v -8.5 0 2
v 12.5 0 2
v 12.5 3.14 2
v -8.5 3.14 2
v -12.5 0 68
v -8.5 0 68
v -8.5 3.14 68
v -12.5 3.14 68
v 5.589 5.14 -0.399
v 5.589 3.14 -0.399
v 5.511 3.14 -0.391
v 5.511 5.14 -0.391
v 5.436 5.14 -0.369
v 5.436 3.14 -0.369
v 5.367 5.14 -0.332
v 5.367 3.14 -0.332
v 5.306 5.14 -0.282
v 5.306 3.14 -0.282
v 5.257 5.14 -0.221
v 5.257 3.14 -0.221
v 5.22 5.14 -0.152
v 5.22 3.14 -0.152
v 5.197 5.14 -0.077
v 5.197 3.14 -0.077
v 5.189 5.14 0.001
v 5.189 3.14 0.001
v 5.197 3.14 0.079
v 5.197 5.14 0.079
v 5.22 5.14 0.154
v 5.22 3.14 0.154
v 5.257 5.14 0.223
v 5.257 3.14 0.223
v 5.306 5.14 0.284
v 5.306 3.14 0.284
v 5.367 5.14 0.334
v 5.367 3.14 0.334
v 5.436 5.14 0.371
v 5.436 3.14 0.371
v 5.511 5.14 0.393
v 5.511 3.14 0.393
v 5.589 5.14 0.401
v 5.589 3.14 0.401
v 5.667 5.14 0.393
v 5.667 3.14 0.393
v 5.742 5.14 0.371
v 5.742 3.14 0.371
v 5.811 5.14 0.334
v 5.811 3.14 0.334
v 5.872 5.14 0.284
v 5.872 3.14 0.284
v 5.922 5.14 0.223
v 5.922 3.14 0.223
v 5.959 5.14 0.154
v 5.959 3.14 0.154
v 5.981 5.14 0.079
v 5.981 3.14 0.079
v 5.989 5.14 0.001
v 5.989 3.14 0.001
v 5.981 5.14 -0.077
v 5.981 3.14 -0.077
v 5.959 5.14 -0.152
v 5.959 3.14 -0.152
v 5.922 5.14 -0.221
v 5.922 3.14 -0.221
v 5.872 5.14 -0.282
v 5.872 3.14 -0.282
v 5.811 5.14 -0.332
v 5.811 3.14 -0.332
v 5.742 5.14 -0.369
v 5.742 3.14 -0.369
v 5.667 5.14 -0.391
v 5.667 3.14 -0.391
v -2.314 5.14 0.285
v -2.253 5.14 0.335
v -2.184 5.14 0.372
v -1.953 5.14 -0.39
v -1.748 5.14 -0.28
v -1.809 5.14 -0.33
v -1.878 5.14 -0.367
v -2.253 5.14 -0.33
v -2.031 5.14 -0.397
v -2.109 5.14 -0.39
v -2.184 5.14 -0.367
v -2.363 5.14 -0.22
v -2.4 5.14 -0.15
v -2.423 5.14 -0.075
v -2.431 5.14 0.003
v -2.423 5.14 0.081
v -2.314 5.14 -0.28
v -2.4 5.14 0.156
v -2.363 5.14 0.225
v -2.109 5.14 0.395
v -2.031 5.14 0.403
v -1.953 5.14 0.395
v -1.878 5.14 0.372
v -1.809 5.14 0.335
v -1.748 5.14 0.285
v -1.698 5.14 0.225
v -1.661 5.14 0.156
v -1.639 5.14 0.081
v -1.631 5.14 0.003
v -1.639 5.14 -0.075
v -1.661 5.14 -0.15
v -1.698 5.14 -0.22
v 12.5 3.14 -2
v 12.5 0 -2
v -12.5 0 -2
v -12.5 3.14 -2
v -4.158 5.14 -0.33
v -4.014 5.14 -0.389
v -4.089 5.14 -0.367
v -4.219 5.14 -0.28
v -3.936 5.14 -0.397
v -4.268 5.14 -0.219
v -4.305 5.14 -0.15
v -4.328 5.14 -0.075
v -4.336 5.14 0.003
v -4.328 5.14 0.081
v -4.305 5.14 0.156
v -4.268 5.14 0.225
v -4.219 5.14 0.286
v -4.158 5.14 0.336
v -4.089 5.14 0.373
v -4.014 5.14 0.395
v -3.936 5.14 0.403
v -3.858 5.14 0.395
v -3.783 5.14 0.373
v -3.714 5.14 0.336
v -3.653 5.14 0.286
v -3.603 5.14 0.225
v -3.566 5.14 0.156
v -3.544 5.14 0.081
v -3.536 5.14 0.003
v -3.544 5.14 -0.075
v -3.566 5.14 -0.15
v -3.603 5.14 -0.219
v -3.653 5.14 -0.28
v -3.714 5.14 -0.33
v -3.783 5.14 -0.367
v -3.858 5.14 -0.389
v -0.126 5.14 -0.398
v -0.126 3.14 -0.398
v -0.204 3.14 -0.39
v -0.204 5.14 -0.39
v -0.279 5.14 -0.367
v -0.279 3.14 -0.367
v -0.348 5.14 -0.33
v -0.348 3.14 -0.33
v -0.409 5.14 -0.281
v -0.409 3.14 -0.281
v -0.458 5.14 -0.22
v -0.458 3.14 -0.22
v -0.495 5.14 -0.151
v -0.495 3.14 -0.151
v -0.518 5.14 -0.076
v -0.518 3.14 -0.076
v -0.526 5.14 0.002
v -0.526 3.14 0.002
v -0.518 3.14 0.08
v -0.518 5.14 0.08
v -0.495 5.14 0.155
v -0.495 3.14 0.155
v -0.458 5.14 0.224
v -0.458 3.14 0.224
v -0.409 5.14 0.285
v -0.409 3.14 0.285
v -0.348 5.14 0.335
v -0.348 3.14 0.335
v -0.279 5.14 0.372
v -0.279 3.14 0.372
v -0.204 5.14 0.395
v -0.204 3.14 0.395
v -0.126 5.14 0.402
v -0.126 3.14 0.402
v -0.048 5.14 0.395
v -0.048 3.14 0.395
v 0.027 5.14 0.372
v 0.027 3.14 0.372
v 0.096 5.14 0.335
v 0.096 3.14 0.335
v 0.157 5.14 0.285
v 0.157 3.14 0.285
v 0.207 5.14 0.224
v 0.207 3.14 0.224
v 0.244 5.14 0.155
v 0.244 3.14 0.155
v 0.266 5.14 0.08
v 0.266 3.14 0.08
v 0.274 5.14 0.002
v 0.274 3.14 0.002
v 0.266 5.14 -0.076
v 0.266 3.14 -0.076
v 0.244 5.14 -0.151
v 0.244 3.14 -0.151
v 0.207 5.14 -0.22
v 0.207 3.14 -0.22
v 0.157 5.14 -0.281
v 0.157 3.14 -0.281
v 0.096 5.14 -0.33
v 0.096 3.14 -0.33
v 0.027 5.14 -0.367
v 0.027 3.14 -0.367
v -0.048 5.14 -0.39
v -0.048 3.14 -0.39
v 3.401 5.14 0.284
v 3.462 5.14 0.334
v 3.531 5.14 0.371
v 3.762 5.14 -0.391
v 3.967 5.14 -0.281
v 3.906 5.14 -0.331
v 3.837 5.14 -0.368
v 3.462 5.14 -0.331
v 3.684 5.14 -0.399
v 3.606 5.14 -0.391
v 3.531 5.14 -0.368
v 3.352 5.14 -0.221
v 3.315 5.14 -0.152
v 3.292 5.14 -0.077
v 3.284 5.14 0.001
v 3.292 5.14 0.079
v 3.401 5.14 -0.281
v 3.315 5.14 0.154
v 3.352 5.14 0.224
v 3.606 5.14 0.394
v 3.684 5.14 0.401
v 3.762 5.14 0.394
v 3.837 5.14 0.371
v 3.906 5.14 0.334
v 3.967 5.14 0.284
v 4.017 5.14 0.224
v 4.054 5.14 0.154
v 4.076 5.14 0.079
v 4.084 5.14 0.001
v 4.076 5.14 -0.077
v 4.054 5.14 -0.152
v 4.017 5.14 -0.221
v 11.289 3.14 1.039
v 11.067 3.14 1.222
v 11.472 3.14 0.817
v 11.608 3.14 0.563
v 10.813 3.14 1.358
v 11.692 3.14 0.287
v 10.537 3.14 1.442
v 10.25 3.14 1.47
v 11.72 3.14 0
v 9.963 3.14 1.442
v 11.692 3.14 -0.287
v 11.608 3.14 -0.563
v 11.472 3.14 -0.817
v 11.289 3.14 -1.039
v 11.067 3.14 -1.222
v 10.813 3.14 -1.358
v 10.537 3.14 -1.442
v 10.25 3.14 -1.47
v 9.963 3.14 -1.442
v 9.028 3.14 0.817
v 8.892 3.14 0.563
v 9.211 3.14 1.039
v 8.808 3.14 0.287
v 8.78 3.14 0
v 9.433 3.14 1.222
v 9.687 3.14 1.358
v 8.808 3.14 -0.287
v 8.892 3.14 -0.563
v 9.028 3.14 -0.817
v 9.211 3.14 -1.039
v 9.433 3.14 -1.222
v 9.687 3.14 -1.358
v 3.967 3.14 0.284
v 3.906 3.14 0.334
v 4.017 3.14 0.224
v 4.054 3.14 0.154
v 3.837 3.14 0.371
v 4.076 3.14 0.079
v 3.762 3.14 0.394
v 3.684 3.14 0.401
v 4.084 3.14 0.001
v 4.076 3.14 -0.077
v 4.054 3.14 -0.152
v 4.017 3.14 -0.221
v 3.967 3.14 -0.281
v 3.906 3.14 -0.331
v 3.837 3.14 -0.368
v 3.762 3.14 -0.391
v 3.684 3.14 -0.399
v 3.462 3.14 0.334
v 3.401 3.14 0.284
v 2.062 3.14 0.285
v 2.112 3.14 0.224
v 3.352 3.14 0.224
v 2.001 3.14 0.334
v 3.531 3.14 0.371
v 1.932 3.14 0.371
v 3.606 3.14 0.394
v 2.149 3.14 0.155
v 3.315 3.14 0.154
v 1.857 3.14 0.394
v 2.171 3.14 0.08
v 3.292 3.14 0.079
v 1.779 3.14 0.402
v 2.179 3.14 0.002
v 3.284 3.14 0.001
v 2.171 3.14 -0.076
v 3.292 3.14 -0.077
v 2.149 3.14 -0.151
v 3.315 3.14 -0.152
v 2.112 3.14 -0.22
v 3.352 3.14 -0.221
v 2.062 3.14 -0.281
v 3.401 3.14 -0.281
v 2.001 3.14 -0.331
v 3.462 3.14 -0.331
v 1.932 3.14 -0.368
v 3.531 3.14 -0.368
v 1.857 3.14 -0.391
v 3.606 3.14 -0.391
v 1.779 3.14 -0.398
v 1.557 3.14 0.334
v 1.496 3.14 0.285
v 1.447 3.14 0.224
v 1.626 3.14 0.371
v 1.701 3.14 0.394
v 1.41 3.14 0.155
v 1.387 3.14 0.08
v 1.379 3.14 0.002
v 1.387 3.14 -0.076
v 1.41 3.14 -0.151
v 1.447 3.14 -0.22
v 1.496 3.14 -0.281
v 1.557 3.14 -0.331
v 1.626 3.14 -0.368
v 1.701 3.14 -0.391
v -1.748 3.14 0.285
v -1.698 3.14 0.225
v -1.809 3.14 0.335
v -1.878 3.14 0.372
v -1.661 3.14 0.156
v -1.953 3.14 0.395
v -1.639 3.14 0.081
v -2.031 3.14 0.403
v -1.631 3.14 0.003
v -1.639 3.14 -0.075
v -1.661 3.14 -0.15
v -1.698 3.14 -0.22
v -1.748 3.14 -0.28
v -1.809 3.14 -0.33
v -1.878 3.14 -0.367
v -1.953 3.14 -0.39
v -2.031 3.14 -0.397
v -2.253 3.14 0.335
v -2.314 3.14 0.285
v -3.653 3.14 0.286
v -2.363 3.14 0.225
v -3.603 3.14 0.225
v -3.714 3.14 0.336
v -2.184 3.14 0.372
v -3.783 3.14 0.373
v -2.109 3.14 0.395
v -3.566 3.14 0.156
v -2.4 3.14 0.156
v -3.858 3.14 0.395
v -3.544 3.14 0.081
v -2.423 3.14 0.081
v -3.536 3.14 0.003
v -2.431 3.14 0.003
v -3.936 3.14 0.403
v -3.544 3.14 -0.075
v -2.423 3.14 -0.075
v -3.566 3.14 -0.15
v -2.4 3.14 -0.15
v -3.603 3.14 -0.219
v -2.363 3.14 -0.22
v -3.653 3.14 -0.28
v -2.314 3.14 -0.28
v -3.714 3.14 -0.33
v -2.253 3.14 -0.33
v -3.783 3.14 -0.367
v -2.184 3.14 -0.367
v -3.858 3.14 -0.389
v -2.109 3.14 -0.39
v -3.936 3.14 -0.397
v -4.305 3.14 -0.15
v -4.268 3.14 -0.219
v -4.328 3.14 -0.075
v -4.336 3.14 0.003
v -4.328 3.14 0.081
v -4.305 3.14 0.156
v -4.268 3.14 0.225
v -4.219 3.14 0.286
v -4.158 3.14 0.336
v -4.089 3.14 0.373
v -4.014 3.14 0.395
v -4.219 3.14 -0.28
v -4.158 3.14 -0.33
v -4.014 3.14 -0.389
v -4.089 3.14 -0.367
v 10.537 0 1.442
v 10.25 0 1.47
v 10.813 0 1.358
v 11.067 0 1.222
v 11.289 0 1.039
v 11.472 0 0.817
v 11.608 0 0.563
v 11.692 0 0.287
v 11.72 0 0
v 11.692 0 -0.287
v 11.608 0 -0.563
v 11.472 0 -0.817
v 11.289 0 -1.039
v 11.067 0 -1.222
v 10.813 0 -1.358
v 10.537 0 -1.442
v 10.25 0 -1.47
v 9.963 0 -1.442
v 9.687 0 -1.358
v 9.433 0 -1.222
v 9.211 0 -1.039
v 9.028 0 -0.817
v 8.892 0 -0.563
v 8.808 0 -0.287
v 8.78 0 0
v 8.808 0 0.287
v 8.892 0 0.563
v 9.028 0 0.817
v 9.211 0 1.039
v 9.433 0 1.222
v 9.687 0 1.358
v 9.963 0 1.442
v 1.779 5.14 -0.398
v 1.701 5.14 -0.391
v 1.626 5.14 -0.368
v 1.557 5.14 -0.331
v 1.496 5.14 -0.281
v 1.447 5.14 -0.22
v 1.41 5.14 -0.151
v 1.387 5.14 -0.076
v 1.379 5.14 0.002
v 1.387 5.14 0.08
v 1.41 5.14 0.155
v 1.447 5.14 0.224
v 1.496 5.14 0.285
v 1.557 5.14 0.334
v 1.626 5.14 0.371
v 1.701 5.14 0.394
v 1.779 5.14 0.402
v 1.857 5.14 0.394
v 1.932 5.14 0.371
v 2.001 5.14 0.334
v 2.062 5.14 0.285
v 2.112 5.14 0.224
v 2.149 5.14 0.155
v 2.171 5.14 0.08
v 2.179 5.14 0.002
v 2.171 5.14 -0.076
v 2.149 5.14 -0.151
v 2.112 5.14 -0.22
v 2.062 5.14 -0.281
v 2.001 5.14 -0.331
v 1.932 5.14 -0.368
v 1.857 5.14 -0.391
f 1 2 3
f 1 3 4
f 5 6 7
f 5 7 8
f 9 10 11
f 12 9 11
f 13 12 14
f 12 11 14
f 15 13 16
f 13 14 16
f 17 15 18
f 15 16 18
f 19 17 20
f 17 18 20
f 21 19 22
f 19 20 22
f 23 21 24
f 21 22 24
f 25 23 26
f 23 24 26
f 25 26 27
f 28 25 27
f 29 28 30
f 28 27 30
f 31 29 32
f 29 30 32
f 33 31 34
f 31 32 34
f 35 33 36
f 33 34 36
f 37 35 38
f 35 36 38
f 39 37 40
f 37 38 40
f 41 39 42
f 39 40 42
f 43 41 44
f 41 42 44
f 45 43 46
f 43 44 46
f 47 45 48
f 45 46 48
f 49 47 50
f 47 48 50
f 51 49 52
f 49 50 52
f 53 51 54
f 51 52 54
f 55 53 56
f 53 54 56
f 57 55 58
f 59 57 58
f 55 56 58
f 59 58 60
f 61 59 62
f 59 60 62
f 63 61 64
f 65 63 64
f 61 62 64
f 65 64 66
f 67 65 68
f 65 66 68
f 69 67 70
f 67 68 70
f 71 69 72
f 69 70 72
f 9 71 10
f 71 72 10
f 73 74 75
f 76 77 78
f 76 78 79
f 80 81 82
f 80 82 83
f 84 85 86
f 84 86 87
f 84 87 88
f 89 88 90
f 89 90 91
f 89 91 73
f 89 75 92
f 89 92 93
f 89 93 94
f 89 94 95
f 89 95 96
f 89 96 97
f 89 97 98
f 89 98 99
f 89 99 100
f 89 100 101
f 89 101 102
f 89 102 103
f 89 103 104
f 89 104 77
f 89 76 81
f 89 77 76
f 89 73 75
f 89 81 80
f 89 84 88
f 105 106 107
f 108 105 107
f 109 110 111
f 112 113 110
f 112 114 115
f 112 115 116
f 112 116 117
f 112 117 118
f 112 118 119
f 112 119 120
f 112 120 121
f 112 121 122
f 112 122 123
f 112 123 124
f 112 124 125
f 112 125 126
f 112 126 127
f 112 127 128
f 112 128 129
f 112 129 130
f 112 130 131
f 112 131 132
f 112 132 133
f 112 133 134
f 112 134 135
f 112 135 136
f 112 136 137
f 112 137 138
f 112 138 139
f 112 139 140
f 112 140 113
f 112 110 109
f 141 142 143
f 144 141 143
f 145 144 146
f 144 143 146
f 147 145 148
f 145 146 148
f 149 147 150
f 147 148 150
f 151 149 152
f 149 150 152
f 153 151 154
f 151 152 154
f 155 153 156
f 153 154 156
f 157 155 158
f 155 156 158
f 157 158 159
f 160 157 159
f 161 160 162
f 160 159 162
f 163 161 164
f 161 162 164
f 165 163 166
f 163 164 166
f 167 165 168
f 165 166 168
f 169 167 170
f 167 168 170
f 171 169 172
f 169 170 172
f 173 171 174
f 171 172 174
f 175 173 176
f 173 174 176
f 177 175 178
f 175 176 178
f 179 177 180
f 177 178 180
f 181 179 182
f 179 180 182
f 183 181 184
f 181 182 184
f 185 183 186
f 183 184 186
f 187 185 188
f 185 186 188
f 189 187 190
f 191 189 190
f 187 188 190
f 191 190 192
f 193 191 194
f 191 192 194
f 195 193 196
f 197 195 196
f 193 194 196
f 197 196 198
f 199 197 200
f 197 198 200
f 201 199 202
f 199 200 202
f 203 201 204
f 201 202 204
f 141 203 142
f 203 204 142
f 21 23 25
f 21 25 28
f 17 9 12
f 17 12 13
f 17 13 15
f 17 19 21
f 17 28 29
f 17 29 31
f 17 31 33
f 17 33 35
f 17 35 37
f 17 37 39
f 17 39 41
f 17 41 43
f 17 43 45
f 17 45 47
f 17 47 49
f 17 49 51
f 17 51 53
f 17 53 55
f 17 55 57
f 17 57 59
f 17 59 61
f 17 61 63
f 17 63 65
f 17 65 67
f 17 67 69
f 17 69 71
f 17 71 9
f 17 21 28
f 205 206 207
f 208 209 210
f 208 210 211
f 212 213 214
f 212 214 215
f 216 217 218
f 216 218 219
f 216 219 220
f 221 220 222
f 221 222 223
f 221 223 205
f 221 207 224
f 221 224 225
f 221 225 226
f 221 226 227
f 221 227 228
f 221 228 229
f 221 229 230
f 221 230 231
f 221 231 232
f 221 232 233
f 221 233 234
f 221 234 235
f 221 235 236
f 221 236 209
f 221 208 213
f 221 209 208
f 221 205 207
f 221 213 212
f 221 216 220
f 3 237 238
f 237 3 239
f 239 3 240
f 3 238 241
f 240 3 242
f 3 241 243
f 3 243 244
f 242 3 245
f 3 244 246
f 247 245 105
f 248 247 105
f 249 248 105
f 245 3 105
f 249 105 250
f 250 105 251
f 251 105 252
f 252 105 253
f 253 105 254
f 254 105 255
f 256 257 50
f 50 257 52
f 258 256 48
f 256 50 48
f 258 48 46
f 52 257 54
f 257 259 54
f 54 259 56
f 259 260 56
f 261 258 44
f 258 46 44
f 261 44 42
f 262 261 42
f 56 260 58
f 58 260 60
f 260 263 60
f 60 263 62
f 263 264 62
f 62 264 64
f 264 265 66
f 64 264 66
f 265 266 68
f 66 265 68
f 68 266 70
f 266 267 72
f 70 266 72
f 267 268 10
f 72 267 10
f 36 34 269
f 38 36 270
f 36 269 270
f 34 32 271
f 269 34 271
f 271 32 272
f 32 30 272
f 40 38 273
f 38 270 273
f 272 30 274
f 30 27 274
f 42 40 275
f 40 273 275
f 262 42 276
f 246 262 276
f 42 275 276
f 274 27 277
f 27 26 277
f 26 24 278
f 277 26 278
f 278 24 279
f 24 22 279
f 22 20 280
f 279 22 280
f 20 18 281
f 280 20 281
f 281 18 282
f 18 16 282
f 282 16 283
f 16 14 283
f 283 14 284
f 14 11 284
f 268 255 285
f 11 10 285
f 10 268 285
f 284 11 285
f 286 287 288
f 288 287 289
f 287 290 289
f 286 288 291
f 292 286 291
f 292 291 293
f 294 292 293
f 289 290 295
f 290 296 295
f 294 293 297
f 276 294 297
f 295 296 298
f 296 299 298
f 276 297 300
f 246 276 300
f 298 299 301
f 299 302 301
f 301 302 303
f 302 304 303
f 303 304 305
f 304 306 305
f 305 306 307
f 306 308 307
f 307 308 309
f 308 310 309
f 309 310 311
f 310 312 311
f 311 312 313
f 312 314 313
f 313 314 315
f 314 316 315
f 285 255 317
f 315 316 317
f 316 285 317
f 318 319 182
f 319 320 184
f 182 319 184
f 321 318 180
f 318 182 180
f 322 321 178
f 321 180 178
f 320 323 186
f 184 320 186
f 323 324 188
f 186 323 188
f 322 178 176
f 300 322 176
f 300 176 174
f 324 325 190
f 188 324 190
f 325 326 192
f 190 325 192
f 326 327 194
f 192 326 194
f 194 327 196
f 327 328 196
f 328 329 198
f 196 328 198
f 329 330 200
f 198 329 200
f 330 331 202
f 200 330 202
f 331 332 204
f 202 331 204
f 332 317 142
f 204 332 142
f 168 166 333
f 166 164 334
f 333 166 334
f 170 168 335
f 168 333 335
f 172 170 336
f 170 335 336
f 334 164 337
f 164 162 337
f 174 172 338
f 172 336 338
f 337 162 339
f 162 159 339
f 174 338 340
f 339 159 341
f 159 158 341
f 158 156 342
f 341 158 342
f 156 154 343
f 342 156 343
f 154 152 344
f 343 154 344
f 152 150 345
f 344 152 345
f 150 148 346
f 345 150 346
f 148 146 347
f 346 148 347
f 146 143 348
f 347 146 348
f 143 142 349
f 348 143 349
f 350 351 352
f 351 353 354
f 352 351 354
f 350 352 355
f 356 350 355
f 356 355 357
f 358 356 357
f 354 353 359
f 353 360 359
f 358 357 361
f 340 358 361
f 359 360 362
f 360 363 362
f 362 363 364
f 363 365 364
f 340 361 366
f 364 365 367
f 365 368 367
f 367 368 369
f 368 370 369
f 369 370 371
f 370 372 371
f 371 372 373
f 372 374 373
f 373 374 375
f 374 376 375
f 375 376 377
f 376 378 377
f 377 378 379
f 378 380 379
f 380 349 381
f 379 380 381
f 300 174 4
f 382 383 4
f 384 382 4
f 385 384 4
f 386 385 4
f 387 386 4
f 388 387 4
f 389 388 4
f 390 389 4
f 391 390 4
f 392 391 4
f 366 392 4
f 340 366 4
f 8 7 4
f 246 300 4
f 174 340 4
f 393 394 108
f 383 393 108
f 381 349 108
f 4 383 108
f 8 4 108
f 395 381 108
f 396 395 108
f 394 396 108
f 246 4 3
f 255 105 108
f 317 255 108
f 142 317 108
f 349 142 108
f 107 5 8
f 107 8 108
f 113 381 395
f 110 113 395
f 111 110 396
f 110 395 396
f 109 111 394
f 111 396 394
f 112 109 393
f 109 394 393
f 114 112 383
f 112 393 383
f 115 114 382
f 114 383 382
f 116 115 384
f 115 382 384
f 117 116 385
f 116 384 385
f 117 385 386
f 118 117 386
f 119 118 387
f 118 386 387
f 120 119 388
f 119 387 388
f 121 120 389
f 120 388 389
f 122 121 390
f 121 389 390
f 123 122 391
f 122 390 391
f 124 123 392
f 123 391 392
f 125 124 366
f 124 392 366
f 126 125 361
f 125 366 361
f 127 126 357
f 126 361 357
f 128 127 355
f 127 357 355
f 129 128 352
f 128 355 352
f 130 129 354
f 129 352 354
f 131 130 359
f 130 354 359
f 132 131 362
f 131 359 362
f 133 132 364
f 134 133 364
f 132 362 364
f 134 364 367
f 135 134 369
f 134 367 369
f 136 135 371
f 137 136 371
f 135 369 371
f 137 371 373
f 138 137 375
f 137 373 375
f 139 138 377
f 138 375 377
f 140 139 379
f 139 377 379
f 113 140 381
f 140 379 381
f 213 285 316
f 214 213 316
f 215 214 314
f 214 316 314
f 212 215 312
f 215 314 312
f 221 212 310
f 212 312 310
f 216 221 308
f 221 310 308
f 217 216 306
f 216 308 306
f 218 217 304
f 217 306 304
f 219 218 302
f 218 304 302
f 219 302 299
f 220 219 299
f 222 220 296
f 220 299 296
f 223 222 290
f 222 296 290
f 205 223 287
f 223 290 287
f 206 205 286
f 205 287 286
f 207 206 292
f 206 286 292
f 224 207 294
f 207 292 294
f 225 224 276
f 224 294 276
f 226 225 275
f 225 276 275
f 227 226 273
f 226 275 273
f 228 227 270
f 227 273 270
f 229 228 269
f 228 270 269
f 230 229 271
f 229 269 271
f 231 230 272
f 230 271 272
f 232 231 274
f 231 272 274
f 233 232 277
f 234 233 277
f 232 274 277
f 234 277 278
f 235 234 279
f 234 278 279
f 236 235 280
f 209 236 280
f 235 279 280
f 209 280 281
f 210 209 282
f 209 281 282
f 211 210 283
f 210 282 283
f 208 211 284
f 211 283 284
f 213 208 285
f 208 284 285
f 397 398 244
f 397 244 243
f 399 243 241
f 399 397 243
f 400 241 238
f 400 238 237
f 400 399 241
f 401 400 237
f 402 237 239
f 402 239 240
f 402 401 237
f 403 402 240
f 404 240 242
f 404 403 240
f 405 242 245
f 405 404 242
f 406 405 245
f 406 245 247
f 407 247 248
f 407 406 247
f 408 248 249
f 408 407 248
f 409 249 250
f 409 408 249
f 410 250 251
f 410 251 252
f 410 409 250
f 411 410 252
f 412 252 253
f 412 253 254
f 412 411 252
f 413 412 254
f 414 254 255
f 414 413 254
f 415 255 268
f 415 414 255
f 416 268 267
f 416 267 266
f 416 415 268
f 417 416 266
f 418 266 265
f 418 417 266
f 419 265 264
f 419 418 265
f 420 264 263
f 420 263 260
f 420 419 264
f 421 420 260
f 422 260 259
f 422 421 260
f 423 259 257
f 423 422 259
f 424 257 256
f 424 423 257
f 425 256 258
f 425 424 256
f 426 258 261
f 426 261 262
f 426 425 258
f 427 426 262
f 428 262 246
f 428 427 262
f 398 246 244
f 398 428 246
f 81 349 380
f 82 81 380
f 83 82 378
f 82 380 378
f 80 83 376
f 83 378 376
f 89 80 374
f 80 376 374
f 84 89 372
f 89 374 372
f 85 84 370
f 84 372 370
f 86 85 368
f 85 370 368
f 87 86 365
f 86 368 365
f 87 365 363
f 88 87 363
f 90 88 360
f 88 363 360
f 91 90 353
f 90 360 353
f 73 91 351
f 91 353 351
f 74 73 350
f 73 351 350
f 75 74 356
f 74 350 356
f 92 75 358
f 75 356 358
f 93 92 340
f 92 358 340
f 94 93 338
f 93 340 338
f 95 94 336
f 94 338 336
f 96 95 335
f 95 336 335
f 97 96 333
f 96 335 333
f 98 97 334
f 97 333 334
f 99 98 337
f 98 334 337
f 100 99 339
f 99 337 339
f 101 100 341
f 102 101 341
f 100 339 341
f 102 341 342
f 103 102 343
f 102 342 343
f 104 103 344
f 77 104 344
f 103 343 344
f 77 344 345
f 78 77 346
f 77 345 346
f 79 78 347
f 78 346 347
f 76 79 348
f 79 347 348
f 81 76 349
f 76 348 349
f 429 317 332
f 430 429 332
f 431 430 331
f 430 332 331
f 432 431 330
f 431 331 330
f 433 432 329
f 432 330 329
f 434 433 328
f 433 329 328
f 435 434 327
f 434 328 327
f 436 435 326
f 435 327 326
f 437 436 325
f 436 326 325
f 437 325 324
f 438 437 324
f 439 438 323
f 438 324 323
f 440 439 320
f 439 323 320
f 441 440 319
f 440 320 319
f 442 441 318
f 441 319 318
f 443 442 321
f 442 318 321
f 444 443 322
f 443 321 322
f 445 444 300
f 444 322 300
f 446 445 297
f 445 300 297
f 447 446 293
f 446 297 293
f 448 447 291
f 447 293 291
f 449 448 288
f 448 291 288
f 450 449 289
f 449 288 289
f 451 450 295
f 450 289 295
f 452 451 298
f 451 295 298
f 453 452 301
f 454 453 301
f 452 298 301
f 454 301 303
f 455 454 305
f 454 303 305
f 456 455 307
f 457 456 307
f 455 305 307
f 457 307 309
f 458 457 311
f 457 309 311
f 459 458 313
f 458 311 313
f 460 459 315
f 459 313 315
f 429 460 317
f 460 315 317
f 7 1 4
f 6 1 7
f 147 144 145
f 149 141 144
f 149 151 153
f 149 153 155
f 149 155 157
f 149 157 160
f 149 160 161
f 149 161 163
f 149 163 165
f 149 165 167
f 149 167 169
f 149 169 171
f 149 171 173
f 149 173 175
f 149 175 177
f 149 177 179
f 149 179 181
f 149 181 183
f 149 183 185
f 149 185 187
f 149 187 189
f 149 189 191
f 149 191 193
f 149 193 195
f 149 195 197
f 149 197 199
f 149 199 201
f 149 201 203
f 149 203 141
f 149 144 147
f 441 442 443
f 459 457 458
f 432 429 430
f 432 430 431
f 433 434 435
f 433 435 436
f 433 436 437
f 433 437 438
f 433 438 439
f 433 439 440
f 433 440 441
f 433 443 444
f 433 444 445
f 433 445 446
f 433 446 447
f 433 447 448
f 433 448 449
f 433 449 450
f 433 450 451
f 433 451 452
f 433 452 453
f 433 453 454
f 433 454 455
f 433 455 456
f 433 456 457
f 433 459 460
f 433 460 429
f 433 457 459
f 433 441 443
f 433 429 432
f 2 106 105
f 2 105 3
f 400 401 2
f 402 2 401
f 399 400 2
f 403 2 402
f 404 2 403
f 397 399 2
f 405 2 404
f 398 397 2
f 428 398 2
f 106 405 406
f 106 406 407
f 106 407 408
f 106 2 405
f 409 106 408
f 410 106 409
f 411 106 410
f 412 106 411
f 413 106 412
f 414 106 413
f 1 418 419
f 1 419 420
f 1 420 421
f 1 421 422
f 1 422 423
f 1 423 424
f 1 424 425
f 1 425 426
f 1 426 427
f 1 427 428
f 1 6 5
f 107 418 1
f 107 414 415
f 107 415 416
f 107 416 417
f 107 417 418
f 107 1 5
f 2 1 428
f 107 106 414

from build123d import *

# Parameters (mm, degrees)
SKETCH1_R           = 1.47
BOSS_EXTRUDE1_DEPTH = 3.14
SKETCH6_R           = 0.4
BOSS_EXTRUDE4_DEPTH = 2


with BuildPart() as part:
    # Sketch1 → Boss-Extrude1 (new body)
    with BuildSketch(Plane(origin=(0, 0, 0), x_dir=(1, 0, 0), z_dir=(0, 1, 0))):
        Polygon((12.5, 2), (12.5, -2), (-8.5, -2), (-8.5, -68), (-12.5, -68), (-12.5, 2), (-8.5, 2), align=None)
        with Locations(Location((10.25, 0, 0), (0, 0, 270))):
            Circle(SKETCH1_R, mode=Mode.SUBTRACT)
    extrude(amount=BOSS_EXTRUDE1_DEPTH)

    # Sketch6 → Boss-Extrude4 (add)
    with BuildSketch(Plane(origin=(0, 3.14, 0), x_dir=(1, 0, 0), z_dir=(0, 1, 0))):
        with Locations(Location((-3.935899676, -0.003030319, 0), (0, 0, 90))):
            Circle(SKETCH6_R)
        with Locations(Location((-2.03089972, -0.002623383, 0), (0, 0, 90))):
            Circle(SKETCH6_R)
        with Locations(Location((-0.125899763, -0.002216446, 0), (0, 0, 90))):
            Circle(SKETCH6_R)
        with Locations(Location((1.779100193, -0.00180951, 0), (0, 0, 90))):
            Circle(SKETCH6_R)
        with Locations(Location((3.68410015, -0.001402574, 0), (0, 0, 90))):
            Circle(SKETCH6_R)
        with Locations(Location((5.589100106, -0.000995637, 0), (0, 0, 90))):
            Circle(SKETCH6_R)
    extrude(amount=BOSS_EXTRUDE4_DEPTH)


solid = part.part
